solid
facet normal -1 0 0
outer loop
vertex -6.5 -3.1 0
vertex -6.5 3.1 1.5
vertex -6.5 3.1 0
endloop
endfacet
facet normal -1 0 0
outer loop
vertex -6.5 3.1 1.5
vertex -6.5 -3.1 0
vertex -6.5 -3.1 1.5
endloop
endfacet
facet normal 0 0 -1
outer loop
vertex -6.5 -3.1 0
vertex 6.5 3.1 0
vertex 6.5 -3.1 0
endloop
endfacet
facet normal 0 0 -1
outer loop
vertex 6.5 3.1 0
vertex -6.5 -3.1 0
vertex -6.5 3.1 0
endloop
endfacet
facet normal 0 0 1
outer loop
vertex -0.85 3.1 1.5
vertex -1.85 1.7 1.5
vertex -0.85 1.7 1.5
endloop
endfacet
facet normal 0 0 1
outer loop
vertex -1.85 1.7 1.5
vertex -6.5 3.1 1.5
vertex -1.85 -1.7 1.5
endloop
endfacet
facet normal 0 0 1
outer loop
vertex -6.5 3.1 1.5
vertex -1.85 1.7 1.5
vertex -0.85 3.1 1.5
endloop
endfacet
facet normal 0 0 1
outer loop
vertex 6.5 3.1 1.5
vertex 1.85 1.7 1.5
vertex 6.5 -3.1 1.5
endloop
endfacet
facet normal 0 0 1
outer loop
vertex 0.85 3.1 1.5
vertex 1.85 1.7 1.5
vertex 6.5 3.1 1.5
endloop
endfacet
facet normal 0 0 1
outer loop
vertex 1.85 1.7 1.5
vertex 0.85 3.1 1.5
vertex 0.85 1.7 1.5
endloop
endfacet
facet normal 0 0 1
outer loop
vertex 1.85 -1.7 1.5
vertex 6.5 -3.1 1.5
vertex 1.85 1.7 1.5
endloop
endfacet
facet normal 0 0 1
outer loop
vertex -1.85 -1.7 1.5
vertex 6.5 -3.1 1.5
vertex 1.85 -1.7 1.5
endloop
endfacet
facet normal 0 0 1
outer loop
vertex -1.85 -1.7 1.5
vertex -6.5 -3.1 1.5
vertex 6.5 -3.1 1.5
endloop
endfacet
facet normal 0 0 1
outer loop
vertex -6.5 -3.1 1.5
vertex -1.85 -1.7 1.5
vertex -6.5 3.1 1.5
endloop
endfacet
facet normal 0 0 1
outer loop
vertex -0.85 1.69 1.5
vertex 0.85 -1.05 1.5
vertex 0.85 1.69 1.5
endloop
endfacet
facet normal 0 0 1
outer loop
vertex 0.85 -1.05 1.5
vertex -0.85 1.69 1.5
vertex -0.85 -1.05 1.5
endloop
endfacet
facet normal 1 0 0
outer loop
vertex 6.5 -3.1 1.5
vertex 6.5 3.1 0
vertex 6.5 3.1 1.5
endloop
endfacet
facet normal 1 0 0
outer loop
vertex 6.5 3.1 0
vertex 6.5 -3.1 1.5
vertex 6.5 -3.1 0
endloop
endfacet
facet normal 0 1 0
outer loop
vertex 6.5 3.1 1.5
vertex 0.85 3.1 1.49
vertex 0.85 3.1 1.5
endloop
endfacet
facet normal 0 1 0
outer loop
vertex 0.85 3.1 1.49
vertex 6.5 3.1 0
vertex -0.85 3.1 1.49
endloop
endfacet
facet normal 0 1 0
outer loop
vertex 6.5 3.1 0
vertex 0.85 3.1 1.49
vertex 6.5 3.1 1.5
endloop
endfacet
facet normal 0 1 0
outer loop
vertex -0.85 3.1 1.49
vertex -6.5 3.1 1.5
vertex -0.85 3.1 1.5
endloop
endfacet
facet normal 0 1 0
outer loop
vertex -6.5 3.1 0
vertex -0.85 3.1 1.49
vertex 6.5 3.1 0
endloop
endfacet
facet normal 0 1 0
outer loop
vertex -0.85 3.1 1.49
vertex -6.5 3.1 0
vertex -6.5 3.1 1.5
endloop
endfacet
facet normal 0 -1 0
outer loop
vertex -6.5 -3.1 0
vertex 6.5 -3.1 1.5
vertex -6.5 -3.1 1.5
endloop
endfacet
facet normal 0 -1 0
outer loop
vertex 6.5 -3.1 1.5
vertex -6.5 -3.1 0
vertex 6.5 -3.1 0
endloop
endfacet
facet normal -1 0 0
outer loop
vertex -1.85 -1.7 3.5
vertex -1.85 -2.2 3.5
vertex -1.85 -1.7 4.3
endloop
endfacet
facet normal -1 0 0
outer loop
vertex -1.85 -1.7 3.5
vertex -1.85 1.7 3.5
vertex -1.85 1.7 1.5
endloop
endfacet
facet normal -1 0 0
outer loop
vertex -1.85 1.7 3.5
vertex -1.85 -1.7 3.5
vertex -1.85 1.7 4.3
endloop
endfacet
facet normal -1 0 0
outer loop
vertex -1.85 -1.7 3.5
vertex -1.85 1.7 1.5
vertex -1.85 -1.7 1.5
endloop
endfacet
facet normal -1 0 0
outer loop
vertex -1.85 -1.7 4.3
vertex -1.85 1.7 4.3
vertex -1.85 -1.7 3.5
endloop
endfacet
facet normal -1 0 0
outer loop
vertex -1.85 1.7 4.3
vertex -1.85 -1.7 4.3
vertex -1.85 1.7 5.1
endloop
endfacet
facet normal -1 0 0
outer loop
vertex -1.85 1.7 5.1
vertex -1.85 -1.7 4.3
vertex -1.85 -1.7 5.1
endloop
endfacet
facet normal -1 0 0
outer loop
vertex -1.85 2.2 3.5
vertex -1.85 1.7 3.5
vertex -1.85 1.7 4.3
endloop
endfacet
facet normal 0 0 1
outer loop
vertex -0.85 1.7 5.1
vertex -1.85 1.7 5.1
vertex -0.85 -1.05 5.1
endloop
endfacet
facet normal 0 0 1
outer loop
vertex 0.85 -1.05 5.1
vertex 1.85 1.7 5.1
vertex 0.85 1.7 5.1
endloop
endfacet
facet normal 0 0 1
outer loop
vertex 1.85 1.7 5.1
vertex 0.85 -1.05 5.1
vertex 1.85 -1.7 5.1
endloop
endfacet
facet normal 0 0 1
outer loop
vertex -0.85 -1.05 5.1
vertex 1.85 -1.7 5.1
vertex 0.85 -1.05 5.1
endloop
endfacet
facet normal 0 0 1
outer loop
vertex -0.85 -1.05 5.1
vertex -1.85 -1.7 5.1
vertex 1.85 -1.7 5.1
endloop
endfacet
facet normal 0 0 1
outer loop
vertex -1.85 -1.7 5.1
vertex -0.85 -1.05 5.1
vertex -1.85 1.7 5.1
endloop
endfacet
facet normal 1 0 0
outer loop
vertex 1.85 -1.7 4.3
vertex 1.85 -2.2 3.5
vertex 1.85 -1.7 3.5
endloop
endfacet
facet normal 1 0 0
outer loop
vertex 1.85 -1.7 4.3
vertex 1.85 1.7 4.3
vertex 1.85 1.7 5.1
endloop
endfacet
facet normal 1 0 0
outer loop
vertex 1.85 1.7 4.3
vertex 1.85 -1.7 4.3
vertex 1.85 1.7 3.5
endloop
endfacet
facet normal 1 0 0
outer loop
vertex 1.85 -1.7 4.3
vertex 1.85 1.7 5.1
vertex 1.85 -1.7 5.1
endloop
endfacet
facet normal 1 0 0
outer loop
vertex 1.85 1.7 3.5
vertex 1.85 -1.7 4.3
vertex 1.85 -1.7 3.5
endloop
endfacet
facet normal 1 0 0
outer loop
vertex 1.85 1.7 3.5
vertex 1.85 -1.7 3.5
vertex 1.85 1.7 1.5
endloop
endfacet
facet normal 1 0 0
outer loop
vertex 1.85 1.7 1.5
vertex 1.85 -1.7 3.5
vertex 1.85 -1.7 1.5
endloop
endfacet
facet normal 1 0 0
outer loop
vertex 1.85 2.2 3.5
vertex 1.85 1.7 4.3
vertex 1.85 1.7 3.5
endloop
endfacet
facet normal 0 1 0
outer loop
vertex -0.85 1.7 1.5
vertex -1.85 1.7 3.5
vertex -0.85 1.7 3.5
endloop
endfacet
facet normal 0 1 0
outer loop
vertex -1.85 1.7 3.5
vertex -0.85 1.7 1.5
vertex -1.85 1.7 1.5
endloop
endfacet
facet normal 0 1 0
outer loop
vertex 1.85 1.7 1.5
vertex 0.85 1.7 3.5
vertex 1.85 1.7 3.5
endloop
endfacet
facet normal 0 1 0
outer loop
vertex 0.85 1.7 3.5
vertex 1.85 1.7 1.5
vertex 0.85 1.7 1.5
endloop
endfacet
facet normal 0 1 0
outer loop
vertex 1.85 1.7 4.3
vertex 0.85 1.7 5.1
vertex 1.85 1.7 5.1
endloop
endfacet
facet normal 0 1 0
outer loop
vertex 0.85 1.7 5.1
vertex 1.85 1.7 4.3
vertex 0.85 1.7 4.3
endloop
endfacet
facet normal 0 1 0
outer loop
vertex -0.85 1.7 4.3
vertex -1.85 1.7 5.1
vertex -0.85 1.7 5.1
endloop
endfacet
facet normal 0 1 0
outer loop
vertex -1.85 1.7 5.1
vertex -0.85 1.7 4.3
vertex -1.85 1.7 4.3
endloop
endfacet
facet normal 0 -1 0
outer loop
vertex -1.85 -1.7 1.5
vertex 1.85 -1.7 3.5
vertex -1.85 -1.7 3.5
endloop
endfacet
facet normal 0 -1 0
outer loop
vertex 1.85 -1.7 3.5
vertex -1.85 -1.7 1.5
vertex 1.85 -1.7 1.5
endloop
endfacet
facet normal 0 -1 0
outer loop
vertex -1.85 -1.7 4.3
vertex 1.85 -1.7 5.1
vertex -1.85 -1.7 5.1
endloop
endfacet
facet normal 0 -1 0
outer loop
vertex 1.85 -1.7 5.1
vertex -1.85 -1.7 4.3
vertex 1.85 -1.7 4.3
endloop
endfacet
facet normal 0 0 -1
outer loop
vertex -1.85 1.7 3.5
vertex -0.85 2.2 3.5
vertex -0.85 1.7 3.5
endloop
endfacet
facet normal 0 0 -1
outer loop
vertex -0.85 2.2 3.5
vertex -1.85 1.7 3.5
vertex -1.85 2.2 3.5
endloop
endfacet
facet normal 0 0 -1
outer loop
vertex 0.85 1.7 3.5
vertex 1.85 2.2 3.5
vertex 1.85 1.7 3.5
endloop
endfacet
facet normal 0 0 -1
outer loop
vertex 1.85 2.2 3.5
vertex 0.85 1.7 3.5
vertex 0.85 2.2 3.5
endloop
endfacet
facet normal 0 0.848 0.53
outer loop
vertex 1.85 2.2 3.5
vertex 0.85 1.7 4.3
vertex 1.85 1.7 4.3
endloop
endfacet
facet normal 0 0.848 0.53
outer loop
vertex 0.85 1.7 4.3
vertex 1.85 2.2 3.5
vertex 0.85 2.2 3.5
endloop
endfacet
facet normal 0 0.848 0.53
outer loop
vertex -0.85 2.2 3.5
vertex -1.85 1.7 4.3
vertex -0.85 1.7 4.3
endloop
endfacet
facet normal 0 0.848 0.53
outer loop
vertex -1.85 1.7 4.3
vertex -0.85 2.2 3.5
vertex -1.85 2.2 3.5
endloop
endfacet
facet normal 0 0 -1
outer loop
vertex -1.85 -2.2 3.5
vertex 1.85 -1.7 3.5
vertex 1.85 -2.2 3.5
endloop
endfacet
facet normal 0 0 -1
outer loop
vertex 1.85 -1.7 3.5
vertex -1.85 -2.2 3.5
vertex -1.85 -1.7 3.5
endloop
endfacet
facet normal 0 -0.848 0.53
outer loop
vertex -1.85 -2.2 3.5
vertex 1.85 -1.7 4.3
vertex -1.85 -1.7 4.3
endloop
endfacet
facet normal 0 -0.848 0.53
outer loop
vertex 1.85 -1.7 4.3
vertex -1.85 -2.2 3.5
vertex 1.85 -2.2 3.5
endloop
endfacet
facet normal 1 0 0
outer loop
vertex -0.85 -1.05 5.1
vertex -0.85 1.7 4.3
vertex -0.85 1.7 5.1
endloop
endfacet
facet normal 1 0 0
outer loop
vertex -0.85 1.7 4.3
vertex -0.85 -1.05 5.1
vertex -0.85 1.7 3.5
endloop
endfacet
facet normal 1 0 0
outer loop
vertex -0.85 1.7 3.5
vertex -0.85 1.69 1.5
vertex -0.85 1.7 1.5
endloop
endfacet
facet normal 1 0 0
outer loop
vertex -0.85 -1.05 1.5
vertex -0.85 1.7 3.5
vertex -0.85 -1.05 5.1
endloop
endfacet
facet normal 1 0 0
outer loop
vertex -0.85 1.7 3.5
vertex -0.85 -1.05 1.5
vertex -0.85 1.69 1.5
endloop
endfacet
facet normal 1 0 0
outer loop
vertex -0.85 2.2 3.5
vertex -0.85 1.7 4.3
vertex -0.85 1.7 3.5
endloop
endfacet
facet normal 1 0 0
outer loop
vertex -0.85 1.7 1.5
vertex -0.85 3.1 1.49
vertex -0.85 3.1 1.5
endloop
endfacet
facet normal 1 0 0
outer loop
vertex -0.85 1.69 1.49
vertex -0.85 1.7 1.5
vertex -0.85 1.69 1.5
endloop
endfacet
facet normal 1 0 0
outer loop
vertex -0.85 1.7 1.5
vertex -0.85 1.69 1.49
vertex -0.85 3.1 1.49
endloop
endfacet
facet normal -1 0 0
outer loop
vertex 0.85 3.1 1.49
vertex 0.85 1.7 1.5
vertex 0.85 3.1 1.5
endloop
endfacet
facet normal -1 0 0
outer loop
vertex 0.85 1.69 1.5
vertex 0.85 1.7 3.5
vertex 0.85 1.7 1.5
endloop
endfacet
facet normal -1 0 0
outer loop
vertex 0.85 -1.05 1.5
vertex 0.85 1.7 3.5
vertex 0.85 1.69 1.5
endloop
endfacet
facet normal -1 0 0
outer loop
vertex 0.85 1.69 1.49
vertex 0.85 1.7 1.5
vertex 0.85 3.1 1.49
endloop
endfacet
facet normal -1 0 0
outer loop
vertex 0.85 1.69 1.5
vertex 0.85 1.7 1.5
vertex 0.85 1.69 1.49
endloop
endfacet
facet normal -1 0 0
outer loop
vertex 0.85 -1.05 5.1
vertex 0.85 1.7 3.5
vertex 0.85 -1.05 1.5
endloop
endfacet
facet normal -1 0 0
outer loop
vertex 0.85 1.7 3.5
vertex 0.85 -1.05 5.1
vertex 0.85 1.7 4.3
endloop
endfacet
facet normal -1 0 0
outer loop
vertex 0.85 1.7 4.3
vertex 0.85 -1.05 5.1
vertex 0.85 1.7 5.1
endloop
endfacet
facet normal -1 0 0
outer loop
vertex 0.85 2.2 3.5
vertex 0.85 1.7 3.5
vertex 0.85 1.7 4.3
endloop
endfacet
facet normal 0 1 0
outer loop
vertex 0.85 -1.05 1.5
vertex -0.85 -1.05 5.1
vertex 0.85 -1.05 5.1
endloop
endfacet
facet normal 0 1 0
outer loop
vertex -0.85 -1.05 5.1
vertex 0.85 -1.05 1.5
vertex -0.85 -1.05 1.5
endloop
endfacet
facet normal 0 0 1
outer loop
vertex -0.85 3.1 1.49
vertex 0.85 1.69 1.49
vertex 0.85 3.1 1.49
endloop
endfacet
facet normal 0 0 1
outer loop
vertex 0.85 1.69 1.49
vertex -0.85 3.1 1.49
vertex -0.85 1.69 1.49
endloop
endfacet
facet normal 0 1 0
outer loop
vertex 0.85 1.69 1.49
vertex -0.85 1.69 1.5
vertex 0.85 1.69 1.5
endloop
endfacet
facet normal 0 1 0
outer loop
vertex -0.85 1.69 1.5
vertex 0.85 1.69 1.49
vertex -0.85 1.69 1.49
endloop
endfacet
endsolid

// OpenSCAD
// ============================================================
// ПОЛЗУНОК ПЕРЕКЛЮЧАТЕЛЯ
// ============================================================

wall_t   = 1.7;
hole_l   = 8.0;
hole_w   = 3.7;
switch_h = 4.0;

pin_w = 1.8;
pin_l = 1.7;

tolerance = 0.15;


// ============================================================
// РАЗМЕРЫ
// ============================================================

leg_l = hole_l - switch_h - tolerance * 2;
leg_w = hole_w - tolerance * 2;
leg_h = wall_t + 0.9;

cap_l = hole_l + 5.0;
cap_w = hole_w + 2.5;
cap_h = 1.5;

tooth_out = 0.5;
tooth_h   = 0.8;


// ============================================================
translate([0, 0, leg_h + cap_h])
    rotate([0, 180, 0])
        main_slider();


// ============================================================

module main_slider()
{
    difference()
    {
        union()
        {
            // ------------------------------------------------
            // ШЛЯПКА
            // ------------------------------------------------

            translate([
                -cap_l/2,
                -cap_w/2,
                leg_h
            ])
                cube([
                    cap_l,
                    cap_w,
                    cap_h
                ]);


            // ------------------------------------------------
            // ОСНОВНАЯ НОЖКА
            // ------------------------------------------------

            translate([
                -leg_l/2,
                -leg_w/2,
                -1
            ])
                cube([
                    leg_l,
                    leg_w,
                    leg_h + 1
                ]);


            // ------------------------------------------------
            // НАРУЖНЫЕ ЗУБЬЯ СО СКОСОМ
            // ------------------------------------------------

            translate([
                -leg_l/2,
                leg_w/2,
                -0.2
            ])
                translate([leg_l/2, tooth_out/2, tooth_h/2])
                    rotate([0, 180, 0])
                        translate([-leg_l/2, -tooth_out/2, -tooth_h/2])
                            snap_tooth(leg_l);


            translate([
                -leg_l/2,
                -leg_w/2,
                -0.2
            ])
                mirror([0,1,0])
                translate([leg_l/2, tooth_out/2, tooth_h/2])
                    rotate([0, 180, 0])
                        translate([-leg_l/2, -tooth_out/2, -tooth_h/2])
                    snap_tooth(leg_l);
        }


        // ====================================================
        // ПОСАДОЧНОЕ МЕСТО ПОД ДВИЖОК
        // ====================================================

        translate([
            -pin_l/2,
            -(pin_w + 2*tolerance)/2,
            -2
        ])
            cube([
                pin_l,
                pin_w + 10*tolerance,
                leg_h + 2
            ]);


        // ====================================================
        // БОКОВОЙ ВХОД
        // ====================================================

        translate([
            -pin_l/2,
            leg_w/2 - 0.01,
            -0.01
        ])
            cube([
                pin_l,
                leg_w/2 + tooth_out + 0.02,
                leg_h + 0.02
            ]);
    }
}


// ============================================================
// ЗУБ ЗАЩЁЛКИ
//
// Внутренняя сторона вертикальная.
// Наружная сторона имеет скос.
//
//              ножка
//                │
//                │
//                ├──────┐
//                │      ╲
//                │       ╲
//                │        └──
//                │
// ============================================================

module snap_tooth(l)
{
    polyhedron(
        points = [
            // Внутренняя сторона
            [0, 0,         0],
            [l, 0,         0],

            // Наружная нижняя точка
            [0, tooth_out, 0],
            [l, tooth_out, 0],

            // Верхняя точка
            [0, 0,         tooth_h],
            [l, 0,         tooth_h]
        ],

        faces = [
            // Нижняя грань
            [0, 1, 3, 2],

            // Внутренняя вертикальная грань
            [0, 4, 5, 1],

            // Наружный скос
            [2, 3, 5, 4],

            // Торец
            [0, 2, 4],

            // Торец
            [1, 5, 3]
        ]
    );
}
